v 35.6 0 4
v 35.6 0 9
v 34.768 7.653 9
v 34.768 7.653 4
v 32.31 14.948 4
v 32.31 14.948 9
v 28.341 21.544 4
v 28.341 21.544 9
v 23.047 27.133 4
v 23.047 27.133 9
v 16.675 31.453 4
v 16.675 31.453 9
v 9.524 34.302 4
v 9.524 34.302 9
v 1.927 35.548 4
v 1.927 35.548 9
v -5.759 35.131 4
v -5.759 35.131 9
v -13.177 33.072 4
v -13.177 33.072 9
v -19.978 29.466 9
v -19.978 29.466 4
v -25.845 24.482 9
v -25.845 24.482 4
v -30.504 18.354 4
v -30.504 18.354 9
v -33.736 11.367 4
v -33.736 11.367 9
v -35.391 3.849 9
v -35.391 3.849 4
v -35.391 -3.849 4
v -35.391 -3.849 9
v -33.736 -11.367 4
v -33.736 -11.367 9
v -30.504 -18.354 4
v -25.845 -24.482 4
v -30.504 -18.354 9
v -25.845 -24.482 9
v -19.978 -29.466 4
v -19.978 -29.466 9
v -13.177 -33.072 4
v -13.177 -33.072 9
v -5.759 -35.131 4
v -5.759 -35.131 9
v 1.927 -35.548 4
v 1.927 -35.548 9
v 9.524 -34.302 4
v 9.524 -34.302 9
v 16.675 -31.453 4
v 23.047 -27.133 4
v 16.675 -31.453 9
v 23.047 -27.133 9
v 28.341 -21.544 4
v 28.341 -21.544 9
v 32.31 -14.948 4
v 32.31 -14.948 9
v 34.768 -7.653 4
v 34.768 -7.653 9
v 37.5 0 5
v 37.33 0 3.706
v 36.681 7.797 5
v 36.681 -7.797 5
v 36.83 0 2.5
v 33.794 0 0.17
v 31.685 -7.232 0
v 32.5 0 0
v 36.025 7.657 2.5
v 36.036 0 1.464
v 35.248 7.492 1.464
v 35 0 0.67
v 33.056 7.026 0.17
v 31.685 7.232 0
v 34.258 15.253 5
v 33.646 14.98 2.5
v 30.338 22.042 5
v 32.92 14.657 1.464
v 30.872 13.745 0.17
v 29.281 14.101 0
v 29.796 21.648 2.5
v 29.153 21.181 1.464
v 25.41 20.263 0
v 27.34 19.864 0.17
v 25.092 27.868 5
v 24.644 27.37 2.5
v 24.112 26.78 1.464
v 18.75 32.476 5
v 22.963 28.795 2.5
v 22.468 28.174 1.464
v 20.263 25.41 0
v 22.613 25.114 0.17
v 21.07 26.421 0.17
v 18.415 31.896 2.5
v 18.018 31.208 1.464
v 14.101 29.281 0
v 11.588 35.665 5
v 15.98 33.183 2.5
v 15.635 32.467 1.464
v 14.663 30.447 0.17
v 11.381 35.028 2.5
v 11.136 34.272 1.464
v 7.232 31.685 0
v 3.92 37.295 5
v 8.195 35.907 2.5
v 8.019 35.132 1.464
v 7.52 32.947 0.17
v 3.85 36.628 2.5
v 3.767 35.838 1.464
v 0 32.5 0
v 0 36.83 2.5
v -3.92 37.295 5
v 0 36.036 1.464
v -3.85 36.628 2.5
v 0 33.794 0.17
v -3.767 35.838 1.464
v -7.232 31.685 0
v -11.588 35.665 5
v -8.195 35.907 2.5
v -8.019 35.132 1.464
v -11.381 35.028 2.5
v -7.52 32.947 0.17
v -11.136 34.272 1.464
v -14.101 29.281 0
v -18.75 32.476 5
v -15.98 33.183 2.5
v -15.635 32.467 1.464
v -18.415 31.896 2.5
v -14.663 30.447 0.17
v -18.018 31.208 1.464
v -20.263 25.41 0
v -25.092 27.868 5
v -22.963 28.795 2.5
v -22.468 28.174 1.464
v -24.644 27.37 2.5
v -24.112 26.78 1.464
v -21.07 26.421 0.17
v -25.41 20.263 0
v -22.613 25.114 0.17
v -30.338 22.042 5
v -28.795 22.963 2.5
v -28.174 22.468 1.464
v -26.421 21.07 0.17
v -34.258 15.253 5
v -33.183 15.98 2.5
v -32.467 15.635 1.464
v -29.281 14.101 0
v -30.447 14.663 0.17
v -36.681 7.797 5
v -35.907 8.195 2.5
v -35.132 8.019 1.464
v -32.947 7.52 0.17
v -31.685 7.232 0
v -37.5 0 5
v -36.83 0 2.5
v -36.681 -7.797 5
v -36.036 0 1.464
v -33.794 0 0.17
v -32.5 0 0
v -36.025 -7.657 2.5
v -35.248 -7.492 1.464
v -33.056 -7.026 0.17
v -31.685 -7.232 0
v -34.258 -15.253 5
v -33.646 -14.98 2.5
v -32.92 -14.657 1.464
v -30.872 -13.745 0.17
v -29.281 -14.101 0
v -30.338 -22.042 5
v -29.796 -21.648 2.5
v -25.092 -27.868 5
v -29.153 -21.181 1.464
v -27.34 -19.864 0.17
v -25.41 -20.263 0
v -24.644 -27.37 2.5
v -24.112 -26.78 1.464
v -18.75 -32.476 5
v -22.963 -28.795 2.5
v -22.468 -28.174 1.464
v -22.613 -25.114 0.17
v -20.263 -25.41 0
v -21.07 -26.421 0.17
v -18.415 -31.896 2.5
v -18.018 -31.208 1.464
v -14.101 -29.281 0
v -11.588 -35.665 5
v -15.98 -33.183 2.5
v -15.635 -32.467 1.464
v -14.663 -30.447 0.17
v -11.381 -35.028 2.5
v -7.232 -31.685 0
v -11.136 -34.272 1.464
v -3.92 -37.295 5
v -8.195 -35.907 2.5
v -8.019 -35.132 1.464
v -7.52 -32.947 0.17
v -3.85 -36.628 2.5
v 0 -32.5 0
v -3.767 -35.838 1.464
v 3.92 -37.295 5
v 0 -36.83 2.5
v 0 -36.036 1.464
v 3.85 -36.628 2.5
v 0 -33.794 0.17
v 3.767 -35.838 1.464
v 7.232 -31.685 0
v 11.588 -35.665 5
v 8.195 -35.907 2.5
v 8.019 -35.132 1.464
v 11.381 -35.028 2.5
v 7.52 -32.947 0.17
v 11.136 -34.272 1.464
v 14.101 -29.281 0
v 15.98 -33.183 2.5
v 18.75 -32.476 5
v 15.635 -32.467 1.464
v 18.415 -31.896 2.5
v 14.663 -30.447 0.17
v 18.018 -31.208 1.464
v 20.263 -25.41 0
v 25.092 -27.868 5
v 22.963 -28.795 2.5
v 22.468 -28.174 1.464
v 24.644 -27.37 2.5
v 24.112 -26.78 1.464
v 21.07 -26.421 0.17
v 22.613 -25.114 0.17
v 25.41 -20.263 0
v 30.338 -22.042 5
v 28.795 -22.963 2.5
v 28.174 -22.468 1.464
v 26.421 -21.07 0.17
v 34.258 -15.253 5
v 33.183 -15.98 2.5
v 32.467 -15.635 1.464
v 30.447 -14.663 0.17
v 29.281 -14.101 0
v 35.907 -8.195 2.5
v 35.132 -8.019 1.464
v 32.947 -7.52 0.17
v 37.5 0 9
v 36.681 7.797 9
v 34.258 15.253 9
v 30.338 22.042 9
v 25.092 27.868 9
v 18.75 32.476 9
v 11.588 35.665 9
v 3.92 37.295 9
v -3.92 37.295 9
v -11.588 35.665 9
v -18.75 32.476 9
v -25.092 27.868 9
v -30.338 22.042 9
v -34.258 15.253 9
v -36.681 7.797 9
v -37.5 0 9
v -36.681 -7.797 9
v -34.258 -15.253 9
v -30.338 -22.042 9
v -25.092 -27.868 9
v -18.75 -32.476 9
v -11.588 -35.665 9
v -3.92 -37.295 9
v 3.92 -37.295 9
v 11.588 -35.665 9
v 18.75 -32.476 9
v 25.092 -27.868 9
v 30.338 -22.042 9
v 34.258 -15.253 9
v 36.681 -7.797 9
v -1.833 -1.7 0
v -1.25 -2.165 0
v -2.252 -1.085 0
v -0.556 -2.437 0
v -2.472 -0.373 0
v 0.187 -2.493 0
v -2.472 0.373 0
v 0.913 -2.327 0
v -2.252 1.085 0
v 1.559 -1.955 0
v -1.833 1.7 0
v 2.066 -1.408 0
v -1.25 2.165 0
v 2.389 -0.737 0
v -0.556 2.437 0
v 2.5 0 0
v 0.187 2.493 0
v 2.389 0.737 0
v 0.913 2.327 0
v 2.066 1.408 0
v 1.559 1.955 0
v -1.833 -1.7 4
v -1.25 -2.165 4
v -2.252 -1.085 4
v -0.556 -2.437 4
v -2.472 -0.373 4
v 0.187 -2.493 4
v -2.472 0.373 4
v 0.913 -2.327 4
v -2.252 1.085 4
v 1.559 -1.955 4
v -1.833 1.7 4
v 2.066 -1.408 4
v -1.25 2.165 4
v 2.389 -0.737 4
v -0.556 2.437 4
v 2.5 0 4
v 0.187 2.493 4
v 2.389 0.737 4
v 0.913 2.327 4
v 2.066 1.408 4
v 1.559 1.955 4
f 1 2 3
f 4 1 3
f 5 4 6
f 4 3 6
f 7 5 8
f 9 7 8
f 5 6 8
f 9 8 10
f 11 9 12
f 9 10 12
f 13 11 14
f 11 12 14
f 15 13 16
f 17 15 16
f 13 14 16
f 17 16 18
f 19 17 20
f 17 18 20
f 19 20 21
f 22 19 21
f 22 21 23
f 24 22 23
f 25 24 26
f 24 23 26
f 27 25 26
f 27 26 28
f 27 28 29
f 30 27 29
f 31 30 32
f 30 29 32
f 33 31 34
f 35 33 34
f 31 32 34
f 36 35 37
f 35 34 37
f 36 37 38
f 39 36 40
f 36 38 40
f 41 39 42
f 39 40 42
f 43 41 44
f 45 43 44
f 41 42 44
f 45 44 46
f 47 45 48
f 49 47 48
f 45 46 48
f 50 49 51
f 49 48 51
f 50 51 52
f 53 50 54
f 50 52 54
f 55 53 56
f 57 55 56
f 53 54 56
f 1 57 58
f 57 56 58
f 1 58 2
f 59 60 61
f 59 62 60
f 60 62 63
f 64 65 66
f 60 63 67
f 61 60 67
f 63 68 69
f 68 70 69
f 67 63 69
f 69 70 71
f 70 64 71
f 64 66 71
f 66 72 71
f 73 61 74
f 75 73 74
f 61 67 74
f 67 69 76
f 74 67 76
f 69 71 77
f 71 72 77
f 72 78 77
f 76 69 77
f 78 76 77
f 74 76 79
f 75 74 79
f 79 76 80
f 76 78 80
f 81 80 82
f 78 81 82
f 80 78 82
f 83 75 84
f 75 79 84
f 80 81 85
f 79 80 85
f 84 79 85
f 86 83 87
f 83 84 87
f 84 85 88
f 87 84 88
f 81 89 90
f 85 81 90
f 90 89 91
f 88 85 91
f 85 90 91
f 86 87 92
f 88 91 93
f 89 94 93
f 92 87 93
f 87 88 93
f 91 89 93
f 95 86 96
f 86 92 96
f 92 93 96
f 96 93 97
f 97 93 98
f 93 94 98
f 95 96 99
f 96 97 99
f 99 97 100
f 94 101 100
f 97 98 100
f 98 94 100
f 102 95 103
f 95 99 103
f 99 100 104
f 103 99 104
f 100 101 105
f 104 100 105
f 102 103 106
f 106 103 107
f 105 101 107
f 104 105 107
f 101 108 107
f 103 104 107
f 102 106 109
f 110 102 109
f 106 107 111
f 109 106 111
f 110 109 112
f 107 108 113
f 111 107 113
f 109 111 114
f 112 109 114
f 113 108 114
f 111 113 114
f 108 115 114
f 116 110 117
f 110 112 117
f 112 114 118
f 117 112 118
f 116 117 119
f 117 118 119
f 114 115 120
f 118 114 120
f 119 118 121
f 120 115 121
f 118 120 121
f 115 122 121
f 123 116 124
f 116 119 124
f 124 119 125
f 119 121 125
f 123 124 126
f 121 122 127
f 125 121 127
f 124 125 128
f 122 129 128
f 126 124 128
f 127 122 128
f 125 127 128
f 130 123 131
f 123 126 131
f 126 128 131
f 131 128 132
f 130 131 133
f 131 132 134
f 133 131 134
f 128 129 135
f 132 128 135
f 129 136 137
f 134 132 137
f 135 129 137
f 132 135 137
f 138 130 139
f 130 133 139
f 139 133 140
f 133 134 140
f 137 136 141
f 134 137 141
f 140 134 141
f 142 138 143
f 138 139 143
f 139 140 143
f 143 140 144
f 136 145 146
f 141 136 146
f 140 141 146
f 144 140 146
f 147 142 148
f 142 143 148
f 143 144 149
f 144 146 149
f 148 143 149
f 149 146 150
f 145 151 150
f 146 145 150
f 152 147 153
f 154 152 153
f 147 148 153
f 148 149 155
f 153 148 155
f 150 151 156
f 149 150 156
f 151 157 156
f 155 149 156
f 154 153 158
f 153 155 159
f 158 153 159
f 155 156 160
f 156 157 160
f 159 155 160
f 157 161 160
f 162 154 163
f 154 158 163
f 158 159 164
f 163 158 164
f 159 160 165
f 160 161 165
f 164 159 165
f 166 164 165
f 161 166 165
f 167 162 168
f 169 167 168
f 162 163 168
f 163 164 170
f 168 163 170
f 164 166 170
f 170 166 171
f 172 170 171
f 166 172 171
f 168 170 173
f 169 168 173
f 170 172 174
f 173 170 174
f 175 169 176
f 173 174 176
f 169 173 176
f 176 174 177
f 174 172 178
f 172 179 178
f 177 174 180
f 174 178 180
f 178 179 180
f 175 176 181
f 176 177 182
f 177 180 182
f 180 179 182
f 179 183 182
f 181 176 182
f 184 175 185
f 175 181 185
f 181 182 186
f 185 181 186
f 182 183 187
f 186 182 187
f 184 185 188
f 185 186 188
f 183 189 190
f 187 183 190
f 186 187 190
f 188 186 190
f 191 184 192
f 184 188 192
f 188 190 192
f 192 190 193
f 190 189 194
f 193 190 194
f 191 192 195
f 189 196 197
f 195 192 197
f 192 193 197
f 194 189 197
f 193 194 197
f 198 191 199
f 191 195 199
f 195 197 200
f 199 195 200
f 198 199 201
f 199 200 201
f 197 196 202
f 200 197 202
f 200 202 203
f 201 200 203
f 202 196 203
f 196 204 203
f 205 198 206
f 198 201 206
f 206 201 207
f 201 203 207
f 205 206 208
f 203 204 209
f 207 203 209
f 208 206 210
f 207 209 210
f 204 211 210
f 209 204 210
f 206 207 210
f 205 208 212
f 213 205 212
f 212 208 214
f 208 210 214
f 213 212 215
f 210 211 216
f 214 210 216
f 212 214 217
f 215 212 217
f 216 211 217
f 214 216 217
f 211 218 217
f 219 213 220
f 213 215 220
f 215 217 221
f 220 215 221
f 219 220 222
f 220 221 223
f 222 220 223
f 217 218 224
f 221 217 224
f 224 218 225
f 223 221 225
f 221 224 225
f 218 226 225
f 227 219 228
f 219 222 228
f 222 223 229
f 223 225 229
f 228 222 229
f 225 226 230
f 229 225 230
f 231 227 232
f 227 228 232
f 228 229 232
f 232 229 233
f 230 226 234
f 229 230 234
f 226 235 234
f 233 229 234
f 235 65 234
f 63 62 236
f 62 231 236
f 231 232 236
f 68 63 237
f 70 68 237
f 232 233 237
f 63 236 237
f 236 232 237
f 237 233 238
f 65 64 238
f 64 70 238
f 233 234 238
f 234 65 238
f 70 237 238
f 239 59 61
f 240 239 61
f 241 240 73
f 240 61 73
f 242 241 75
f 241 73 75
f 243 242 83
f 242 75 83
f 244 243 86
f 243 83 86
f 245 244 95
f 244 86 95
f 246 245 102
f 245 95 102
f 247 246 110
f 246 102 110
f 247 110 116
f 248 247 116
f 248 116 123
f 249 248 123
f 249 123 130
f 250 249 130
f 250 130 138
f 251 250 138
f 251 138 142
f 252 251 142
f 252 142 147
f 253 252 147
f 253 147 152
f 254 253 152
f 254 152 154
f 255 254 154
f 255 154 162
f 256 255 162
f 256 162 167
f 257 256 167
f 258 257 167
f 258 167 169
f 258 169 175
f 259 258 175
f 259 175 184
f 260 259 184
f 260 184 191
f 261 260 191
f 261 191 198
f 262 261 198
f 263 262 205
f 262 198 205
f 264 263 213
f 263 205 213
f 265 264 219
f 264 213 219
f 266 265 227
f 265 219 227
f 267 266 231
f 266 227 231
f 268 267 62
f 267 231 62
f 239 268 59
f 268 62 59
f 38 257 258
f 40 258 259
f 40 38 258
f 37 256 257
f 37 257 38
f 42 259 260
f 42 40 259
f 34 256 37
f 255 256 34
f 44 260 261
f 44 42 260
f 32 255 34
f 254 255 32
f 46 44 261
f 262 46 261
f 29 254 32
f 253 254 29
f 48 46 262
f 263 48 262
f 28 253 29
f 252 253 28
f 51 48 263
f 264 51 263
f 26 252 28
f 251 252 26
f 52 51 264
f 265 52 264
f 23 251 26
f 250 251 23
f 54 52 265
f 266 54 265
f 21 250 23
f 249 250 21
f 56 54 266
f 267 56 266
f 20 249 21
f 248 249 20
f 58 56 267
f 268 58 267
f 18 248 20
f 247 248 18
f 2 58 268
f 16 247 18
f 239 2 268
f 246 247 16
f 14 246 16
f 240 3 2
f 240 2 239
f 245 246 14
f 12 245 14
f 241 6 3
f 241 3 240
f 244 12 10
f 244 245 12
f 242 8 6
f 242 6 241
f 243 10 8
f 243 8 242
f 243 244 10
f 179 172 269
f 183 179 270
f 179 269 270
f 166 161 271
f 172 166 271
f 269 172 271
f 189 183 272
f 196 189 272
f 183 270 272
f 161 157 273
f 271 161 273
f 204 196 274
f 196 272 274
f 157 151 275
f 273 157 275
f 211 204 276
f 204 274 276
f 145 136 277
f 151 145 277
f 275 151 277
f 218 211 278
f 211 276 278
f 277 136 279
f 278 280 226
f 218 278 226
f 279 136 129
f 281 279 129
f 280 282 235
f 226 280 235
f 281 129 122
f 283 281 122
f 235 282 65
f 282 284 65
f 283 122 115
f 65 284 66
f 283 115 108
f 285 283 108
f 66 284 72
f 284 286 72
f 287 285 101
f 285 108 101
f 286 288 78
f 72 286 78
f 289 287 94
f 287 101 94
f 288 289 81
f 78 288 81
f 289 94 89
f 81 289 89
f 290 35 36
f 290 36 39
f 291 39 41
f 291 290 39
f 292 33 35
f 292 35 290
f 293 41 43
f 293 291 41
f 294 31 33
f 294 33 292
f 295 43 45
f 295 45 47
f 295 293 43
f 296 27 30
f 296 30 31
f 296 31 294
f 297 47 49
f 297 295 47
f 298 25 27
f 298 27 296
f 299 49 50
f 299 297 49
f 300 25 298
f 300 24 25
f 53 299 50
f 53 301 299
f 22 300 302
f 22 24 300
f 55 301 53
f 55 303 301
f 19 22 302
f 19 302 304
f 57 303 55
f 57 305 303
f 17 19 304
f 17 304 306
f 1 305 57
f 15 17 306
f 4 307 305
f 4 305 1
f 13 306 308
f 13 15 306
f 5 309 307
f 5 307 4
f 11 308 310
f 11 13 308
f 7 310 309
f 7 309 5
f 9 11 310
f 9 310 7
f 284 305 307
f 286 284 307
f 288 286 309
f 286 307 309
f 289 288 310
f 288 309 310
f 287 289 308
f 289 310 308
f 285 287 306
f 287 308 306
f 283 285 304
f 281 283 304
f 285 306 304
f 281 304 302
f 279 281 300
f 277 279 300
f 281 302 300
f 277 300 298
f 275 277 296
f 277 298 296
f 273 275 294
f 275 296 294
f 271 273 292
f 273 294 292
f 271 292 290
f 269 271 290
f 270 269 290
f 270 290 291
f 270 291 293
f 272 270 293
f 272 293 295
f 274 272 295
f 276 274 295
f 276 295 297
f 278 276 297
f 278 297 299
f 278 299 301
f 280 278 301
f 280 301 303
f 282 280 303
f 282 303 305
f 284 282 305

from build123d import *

# Parameters (mm, degrees)
F0_R     = 37.5
F1_DEPTH = 4
F2_R     = 37.5
F2_R_2   = 33.5
F3_DEPTH = 5
F4_R     = 35.6
F5_DEPTH = 5
F6_R     = 2.5
F7_DEPTH = 4.001
F8_R     = 5


with BuildPart() as f1:
    # F0 (on Top) → F1 (new body)
    with BuildSketch(Plane.XY):
        Circle(F0_R)
    extrude(amount=F1_DEPTH)

    # F2 (on face) → F3 (join)
    with BuildSketch(Plane.XY.offset(4)):
        Circle(F2_R)
        Circle(F2_R_2, mode=Mode.SUBTRACT)
    extrude(amount=F3_DEPTH)

    # F4 (on face) → F5 (cut)
    with BuildSketch(Plane.XY.offset(9)):
        Circle(F4_R)
    extrude(amount=-F5_DEPTH, mode=Mode.SUBTRACT)

    # F6 (on face) → F7 (cut, through all)
    with BuildSketch(Plane.XY.offset(4)):
        Circle(F6_R)
    extrude(amount=-F7_DEPTH, mode=Mode.SUBTRACT)

    # F8
    f8_edges = [f1.edges().sort_by_distance(p)[0] for p in [
        (-37.5, 0, 0),
    ]]
    fillet(f8_edges, radius=F8_R)


solid = f1.part
